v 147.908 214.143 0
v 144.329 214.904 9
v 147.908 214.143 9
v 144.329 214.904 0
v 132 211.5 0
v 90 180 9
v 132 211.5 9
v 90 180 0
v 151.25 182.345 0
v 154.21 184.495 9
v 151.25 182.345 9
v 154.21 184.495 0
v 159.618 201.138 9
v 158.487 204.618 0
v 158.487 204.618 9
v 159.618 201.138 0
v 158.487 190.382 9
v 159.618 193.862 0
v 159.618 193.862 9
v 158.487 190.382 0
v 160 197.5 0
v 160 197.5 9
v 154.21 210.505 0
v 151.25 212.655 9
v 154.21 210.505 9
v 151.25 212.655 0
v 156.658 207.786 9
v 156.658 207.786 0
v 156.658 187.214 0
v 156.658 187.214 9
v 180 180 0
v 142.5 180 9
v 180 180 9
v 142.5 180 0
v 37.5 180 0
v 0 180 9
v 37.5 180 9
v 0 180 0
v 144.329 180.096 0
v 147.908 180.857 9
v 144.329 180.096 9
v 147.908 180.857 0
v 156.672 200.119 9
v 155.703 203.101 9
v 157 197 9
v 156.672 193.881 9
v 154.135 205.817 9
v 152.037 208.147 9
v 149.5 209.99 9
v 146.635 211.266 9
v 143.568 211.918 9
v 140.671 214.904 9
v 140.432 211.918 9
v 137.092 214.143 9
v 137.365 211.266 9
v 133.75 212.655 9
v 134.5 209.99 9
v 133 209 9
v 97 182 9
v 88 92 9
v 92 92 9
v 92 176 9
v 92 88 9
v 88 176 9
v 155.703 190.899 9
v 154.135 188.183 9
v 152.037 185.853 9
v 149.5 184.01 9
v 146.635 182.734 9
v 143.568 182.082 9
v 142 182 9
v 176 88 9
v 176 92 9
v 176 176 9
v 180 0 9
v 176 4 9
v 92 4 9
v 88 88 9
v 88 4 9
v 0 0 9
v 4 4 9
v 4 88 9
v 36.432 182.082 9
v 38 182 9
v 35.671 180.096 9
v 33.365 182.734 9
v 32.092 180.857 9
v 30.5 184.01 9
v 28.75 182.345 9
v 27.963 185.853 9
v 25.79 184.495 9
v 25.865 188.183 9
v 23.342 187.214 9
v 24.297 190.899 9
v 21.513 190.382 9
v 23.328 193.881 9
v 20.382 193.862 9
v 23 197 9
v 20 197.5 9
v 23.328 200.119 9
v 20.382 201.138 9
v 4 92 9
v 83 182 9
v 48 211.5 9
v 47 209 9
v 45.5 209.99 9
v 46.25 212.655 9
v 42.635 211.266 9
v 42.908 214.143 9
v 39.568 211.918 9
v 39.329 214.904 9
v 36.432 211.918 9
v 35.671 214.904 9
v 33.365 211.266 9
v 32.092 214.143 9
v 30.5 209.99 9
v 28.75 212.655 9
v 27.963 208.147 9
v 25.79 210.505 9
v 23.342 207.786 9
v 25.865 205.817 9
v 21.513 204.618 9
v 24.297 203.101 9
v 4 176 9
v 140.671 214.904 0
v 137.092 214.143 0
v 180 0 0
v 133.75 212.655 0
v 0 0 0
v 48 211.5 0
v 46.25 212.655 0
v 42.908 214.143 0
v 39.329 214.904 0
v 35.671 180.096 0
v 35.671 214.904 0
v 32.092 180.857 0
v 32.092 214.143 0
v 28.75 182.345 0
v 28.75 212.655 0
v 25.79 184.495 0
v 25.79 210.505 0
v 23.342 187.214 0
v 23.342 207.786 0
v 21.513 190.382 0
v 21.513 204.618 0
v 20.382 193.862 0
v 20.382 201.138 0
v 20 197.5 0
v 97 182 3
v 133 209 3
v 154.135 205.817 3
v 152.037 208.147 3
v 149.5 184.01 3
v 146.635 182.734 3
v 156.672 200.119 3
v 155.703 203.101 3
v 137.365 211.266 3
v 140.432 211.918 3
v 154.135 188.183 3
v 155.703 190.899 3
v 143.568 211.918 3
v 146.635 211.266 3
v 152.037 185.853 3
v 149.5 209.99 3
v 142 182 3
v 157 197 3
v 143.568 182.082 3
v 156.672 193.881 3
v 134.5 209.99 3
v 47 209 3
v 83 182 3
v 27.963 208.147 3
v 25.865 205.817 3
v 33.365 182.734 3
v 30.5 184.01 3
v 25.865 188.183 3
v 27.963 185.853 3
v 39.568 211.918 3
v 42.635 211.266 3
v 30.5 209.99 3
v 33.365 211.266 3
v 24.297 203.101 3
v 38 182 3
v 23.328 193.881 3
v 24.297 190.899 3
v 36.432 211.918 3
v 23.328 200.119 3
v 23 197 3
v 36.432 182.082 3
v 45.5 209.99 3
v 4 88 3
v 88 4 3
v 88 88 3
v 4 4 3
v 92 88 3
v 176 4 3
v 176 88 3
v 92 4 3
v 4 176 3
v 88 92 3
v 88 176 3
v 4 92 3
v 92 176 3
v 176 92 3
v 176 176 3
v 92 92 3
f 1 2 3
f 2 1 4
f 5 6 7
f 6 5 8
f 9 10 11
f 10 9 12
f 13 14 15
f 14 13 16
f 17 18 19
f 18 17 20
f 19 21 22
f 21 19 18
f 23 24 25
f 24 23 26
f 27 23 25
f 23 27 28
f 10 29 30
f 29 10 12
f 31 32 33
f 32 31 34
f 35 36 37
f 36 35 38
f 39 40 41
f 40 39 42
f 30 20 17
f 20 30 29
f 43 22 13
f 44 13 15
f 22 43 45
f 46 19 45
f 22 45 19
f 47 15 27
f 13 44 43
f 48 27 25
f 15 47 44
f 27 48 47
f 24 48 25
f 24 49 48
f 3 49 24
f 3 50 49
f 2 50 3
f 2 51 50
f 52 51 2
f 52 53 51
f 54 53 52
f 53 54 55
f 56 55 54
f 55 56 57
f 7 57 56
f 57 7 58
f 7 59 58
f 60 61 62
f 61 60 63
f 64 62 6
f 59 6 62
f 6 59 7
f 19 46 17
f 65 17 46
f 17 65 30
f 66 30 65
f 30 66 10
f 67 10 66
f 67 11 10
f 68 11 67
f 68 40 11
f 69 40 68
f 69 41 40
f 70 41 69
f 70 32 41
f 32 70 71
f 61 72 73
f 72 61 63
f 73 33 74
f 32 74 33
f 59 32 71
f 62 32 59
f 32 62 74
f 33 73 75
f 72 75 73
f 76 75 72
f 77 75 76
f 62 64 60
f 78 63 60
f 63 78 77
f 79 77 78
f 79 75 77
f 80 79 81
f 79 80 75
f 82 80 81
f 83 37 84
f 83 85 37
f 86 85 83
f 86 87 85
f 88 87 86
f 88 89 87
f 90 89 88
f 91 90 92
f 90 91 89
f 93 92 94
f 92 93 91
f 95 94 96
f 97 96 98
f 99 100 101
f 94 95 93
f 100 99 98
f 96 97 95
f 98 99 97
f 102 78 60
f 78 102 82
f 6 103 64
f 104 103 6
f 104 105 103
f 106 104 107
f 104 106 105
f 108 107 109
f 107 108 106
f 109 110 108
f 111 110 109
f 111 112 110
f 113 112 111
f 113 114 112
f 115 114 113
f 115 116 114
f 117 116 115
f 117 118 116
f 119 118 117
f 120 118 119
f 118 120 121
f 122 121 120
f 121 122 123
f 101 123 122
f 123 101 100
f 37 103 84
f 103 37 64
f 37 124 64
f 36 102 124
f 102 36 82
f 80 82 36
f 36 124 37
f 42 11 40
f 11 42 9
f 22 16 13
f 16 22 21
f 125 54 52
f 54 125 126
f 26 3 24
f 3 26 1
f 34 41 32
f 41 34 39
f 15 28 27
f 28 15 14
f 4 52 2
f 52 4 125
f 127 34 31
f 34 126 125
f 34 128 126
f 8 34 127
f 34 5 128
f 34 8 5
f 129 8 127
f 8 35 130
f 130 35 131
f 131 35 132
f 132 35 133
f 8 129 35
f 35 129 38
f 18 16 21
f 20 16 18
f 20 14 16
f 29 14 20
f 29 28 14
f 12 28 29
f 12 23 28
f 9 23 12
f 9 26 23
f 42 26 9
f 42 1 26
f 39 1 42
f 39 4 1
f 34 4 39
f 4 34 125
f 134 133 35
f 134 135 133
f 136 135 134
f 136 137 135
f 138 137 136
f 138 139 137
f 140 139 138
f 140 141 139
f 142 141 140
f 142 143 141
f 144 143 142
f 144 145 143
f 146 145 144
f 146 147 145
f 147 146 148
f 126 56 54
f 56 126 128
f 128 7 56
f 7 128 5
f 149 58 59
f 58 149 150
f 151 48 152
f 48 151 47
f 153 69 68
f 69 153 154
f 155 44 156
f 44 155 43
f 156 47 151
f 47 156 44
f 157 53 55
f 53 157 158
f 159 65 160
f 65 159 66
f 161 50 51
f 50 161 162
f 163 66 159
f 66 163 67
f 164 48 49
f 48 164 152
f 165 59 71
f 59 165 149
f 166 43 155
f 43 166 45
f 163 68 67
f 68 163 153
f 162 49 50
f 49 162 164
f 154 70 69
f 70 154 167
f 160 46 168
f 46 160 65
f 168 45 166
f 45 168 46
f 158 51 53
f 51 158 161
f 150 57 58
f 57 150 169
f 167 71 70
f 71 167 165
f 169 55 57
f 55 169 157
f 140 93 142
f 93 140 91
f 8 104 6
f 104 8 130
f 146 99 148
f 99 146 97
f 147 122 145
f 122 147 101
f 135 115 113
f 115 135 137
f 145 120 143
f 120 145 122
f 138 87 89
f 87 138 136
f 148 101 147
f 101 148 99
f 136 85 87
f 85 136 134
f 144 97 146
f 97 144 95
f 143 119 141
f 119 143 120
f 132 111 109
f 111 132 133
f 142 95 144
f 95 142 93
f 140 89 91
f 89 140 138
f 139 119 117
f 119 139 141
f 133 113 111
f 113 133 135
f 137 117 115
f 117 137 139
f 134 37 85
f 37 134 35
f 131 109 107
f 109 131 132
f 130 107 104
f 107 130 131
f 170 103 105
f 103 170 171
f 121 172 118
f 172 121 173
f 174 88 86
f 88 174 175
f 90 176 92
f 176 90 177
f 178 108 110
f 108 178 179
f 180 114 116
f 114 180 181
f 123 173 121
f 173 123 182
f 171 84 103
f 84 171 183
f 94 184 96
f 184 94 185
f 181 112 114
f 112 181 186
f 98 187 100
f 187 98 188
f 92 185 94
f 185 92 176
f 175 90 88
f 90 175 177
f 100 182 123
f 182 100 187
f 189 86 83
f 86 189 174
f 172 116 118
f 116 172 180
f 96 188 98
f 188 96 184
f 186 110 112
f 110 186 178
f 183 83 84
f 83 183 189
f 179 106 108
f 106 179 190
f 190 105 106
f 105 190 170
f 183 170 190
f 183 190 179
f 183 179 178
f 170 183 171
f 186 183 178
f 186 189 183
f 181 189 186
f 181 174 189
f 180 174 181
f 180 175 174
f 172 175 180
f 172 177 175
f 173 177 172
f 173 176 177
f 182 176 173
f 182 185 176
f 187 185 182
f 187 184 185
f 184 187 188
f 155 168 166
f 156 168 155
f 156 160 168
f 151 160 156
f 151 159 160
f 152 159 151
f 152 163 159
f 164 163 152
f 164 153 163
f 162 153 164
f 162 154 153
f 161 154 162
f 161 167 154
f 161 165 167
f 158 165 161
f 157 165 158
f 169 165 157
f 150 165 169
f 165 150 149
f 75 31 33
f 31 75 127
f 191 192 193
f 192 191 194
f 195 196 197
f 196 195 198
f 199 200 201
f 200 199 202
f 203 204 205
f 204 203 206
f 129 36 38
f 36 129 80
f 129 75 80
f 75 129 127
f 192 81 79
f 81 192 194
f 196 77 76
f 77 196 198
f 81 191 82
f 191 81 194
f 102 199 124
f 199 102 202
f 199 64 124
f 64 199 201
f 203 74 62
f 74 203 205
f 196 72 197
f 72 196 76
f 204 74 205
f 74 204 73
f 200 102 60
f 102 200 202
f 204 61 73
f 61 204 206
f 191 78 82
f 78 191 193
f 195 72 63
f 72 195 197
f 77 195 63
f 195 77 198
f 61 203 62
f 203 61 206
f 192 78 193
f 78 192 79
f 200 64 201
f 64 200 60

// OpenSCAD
module ribbon() {
	size = 70;
	diameter = 35;
	x=size - diameter/2;
	y=diameter/2;

	hull() {
		translate([x, y, 0]) circle(d=diameter);

		alfa=asin(y / sqrt(x*x + y*y));
		xt=x * cos(2*alfa);
		yt=x * sin(2*alfa);
		polygon([[x, 0], [0,0], [xt,yt]]);
	}
}

module small_ribbon() {
	size = 60;
	diameter = 30;
	x=size - diameter/2;
	y=diameter/2;

	hull() {
		translate([x, y, 0]) circle(d=diameter);

		alfa=asin(y / sqrt(x*x + y*y));
		xt=x * cos(2*alfa);
		yt=x * sin(2*alfa);
		polygon([[x, 0], [0,0], [xt,yt]]);
	}
}


linear_extrude(3) {
	translate([90, 180, 0]) ribbon();
}

difference() {
	linear_extrude(9) {
		translate([90, 180, 0]) ribbon();
	}

	linear_extrude(9.1) {
		translate([97, 182, 0]) small_ribbon();
	}
}



rotate([0, 180, 0]) {
	translate([0, 0, -3]) linear_extrude(3) {
		translate([-90, 180, 0]) ribbon();
	}

	difference() {
		translate([0, 0, -9]) linear_extrude(9) {
			translate([-90, 180, 0]) ribbon();
		}

		translate([0, 0, -9.1]) linear_extrude(9.1) {
			translate([-83, 182, 0]) small_ribbon();
		}
	}
}

cube([180, 180, 3]);


cube([180, 4, 9]);
cube([4, 180, 9]);

translate([0, 176, 0]) cube([180, 4, 9]);
translate([176, 0, 0]) cube([4, 180, 9]);


translate([0, 176/2, 0]) cube([180, 4, 9]);
translate([176/2, 0, 0]) cube([4, 180, 9]);
